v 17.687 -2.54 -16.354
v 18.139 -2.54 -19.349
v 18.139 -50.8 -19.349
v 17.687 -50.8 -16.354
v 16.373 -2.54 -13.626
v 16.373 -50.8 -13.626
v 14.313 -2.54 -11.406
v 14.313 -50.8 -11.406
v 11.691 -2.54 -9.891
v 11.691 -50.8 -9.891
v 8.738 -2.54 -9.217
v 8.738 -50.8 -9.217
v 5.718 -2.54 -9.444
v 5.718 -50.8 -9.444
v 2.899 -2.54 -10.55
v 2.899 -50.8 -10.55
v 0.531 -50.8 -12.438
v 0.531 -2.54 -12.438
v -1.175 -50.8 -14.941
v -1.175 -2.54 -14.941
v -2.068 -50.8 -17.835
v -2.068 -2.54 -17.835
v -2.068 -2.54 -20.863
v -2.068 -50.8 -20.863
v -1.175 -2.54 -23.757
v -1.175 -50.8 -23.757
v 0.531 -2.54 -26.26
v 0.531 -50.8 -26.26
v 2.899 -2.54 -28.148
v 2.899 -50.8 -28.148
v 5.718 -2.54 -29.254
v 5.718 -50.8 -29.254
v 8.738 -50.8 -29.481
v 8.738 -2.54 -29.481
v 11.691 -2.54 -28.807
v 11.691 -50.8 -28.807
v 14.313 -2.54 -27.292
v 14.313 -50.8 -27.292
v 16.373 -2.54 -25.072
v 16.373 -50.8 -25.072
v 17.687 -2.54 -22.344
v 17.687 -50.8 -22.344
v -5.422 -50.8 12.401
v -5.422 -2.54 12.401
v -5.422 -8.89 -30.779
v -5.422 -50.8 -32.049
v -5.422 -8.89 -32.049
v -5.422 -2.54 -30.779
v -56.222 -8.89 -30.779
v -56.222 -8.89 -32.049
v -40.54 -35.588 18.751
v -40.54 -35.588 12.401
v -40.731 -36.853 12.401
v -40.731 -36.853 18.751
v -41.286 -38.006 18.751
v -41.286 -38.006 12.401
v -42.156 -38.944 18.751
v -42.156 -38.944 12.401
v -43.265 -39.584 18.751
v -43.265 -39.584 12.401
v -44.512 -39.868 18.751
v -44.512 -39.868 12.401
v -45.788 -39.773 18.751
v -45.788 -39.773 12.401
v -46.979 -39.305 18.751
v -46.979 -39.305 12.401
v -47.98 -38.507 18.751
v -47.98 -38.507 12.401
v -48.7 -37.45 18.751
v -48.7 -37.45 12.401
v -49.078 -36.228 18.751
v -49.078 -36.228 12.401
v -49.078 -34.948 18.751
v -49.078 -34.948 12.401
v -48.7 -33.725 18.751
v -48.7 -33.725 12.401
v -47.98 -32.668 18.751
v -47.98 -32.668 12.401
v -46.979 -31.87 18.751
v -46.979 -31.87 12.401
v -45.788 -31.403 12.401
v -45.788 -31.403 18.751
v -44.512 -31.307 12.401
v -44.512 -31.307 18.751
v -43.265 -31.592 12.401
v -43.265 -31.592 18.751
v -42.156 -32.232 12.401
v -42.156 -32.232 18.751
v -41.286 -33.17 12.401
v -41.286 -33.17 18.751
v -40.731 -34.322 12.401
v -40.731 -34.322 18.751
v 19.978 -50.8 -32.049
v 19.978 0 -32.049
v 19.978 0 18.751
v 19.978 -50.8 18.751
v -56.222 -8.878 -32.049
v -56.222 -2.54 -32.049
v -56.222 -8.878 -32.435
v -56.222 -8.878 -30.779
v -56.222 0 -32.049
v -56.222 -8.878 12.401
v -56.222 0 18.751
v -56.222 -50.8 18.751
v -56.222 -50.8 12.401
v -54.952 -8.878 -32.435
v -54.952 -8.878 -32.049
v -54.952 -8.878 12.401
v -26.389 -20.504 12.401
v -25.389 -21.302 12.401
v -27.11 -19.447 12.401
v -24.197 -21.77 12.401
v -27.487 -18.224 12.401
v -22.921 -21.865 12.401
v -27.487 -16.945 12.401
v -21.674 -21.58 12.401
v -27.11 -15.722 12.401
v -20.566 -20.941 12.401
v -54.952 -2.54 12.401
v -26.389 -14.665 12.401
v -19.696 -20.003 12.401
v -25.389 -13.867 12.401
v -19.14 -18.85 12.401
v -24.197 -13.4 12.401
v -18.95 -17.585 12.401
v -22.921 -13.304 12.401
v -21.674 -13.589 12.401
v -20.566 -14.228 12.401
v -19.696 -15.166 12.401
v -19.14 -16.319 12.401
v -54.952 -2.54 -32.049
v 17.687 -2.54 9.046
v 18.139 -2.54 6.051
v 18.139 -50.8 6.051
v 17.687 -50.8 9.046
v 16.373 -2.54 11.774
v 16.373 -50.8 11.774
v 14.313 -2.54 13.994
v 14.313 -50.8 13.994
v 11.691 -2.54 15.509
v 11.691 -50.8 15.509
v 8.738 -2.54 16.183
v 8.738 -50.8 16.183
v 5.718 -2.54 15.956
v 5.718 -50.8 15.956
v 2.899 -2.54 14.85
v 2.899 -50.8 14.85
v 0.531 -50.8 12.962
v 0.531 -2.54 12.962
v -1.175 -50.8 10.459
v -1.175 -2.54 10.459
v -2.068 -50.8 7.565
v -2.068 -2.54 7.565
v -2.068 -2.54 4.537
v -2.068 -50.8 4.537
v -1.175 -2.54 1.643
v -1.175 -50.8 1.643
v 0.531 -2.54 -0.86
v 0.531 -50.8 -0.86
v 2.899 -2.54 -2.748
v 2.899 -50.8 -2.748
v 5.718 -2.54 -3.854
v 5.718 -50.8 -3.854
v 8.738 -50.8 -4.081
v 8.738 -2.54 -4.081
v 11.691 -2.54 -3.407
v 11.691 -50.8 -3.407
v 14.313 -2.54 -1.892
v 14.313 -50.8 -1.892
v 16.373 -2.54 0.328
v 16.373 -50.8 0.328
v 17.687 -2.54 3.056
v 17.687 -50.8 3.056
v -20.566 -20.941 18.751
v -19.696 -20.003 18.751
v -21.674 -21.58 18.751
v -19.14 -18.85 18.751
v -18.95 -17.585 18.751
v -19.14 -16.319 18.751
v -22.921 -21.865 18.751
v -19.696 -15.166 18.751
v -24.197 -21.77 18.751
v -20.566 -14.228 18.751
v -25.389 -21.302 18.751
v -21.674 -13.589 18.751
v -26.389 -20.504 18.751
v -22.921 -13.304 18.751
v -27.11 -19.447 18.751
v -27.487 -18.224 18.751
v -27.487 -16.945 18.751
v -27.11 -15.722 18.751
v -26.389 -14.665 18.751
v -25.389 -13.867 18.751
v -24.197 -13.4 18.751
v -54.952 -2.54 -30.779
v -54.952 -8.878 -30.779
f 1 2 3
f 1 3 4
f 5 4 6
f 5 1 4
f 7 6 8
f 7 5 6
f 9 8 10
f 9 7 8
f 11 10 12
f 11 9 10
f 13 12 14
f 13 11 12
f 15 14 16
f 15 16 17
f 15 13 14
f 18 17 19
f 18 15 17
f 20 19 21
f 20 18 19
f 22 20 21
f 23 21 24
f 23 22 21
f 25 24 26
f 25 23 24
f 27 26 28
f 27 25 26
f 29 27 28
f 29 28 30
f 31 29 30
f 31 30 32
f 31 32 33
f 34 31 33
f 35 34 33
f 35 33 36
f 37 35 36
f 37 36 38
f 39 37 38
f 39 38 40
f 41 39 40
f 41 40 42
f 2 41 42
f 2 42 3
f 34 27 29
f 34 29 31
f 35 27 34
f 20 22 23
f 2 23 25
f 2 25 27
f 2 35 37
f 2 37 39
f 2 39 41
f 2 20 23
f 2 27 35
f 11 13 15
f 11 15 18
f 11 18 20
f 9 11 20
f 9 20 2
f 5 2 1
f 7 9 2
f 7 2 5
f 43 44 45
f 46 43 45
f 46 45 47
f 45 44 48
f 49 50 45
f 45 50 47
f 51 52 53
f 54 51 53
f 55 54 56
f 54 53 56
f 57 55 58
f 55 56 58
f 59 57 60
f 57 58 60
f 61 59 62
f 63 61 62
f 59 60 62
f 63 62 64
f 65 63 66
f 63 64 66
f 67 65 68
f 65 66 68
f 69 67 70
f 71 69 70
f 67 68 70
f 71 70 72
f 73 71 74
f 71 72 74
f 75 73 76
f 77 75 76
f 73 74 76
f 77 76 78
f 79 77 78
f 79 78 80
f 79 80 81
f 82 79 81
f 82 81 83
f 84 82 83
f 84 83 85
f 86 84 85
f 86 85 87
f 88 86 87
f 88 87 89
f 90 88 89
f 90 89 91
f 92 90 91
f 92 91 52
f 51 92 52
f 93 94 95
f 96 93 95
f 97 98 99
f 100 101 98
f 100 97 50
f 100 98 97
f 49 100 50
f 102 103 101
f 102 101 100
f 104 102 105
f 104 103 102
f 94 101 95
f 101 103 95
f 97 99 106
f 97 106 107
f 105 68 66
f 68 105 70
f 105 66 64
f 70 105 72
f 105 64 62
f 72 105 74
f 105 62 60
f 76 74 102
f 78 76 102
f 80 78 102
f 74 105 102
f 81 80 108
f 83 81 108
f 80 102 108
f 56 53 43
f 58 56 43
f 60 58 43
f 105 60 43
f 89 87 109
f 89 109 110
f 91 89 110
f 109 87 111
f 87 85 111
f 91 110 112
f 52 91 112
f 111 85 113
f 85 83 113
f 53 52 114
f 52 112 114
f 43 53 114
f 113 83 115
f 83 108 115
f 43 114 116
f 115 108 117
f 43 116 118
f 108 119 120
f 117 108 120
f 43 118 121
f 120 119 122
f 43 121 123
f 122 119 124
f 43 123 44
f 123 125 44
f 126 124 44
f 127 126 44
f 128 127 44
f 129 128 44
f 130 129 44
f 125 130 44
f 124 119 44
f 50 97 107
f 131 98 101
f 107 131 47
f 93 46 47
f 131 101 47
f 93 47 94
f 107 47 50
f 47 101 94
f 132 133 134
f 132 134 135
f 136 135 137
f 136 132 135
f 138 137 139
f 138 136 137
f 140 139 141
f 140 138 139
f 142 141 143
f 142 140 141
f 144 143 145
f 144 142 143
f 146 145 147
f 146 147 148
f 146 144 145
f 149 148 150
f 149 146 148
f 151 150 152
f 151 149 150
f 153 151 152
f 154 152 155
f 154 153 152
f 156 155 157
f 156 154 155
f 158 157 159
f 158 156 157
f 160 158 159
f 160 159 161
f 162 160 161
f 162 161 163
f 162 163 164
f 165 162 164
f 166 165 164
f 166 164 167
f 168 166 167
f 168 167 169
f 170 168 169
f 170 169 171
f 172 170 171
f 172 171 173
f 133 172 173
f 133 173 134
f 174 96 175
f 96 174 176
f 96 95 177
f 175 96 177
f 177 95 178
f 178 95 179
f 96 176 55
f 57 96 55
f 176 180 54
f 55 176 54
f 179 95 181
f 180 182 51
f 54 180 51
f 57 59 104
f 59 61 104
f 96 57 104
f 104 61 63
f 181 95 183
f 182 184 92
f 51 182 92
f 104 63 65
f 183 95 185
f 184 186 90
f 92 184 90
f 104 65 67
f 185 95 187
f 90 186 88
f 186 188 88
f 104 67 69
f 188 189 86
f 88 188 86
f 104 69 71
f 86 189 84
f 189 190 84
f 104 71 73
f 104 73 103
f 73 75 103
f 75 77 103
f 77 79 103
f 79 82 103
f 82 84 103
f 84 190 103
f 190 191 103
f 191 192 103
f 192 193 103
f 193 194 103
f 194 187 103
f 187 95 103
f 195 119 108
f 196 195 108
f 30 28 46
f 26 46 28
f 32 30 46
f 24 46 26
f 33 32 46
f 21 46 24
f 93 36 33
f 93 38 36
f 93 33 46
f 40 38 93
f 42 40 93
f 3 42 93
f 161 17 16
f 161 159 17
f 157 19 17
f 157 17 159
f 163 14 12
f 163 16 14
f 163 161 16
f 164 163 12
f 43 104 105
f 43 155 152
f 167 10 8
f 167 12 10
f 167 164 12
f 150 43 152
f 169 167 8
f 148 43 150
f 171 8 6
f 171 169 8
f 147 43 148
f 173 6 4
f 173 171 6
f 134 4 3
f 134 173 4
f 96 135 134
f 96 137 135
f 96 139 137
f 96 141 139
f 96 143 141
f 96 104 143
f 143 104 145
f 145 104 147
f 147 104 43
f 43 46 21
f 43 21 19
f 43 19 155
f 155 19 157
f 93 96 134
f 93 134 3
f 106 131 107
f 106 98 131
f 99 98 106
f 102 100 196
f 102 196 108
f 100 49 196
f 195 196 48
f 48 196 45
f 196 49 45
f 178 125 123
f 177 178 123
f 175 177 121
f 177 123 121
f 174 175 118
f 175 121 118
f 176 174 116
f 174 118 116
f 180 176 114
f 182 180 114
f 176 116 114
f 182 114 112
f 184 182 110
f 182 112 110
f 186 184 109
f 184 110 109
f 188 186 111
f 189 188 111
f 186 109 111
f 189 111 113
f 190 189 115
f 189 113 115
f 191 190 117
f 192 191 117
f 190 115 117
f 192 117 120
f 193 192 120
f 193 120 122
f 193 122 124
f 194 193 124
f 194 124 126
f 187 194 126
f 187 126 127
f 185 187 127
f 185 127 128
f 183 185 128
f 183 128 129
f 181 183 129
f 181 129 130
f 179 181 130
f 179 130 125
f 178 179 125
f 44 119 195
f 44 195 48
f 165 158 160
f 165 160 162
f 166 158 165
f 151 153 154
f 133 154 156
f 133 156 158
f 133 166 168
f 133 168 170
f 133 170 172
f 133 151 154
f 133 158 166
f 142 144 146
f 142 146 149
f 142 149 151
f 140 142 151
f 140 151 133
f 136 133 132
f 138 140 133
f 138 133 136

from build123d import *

# Parameters (mm, degrees)
F0_R     = 10.16
F1_DEPTH = 50.8
F0_W     = 50.8
F0_H     = 44.45
F2_DEPTH = 2.54
F5_DEPTH = 1.27
F3_W     = 50.8
F3_H     = 6.35
F6_DEPTH = 1.27
F7_R     = 4.2926
F8_DEPTH = 6.351


with BuildPart() as f1:
    # F0 (on Front) → F1 (new body)
    with BuildSketch(Plane.XZ):
        Polygon((19.978336, 18.750969), (-56.221664, 18.750969), (-56.221664, 12.400969), (-5.421664, 12.400969), (-5.421664, -32.049031), (19.978336, -32.049031), align=None)
        with Locations((7.978835, -19.349031)):
            Circle(F0_R, mode=Mode.SUBTRACT)
        with Locations((7.978835, 6.050969)):
            Circle(F0_R, mode=Mode.SUBTRACT)
    extrude(amount=F1_DEPTH)

    # F0 (on Front) → F2 (join)
    with BuildSketch(Plane.XZ):
        with Locations((-30.821664, -9.824031)):
            Rectangle(F0_W, F0_H)
        with Locations((7.978835, -19.349031)):
            Circle(F0_R)
        with Locations((7.978835, 6.050969)):
            Circle(F0_R)
    extrude(amount=F2_DEPTH)

    # F4 (on face) → F5 (join)
    with BuildSketch(Plane(origin=(-56.221664, 0, 0), x_dir=(0, -1, 0), z_dir=(-1, 0, 0))):
        Polygon((8.878232, 12.400969), (2.54, 12.400969), (2.54, -32.049031), (8.878232, -32.435447), align=None)
    extrude(amount=-F5_DEPTH)

    # F3 (on face) → F6 (join)
    with BuildSketch(Plane(origin=(0, 0, -32.049031), x_dir=(1, 0, 0), z_dir=(0, 0, -1))):
        with Locations((-30.821664, 5.715)):
            Rectangle(F3_W, F3_H)
    extrude(amount=-F6_DEPTH)

    # F7 (on face) → F8 (cut, through all)
    with BuildSketch(Plane(origin=(0, 0, 12.400969), x_dir=(1, 0, 0), z_dir=(0, 0, -1))):
        with Locations((-44.832879, 35.587724)):
            Circle(F7_R)
        with Locations((-23.242238, 17.584552)):
            Circle(F7_R)
    extrude(amount=-F8_DEPTH, mode=Mode.SUBTRACT)


solid = f1.part
